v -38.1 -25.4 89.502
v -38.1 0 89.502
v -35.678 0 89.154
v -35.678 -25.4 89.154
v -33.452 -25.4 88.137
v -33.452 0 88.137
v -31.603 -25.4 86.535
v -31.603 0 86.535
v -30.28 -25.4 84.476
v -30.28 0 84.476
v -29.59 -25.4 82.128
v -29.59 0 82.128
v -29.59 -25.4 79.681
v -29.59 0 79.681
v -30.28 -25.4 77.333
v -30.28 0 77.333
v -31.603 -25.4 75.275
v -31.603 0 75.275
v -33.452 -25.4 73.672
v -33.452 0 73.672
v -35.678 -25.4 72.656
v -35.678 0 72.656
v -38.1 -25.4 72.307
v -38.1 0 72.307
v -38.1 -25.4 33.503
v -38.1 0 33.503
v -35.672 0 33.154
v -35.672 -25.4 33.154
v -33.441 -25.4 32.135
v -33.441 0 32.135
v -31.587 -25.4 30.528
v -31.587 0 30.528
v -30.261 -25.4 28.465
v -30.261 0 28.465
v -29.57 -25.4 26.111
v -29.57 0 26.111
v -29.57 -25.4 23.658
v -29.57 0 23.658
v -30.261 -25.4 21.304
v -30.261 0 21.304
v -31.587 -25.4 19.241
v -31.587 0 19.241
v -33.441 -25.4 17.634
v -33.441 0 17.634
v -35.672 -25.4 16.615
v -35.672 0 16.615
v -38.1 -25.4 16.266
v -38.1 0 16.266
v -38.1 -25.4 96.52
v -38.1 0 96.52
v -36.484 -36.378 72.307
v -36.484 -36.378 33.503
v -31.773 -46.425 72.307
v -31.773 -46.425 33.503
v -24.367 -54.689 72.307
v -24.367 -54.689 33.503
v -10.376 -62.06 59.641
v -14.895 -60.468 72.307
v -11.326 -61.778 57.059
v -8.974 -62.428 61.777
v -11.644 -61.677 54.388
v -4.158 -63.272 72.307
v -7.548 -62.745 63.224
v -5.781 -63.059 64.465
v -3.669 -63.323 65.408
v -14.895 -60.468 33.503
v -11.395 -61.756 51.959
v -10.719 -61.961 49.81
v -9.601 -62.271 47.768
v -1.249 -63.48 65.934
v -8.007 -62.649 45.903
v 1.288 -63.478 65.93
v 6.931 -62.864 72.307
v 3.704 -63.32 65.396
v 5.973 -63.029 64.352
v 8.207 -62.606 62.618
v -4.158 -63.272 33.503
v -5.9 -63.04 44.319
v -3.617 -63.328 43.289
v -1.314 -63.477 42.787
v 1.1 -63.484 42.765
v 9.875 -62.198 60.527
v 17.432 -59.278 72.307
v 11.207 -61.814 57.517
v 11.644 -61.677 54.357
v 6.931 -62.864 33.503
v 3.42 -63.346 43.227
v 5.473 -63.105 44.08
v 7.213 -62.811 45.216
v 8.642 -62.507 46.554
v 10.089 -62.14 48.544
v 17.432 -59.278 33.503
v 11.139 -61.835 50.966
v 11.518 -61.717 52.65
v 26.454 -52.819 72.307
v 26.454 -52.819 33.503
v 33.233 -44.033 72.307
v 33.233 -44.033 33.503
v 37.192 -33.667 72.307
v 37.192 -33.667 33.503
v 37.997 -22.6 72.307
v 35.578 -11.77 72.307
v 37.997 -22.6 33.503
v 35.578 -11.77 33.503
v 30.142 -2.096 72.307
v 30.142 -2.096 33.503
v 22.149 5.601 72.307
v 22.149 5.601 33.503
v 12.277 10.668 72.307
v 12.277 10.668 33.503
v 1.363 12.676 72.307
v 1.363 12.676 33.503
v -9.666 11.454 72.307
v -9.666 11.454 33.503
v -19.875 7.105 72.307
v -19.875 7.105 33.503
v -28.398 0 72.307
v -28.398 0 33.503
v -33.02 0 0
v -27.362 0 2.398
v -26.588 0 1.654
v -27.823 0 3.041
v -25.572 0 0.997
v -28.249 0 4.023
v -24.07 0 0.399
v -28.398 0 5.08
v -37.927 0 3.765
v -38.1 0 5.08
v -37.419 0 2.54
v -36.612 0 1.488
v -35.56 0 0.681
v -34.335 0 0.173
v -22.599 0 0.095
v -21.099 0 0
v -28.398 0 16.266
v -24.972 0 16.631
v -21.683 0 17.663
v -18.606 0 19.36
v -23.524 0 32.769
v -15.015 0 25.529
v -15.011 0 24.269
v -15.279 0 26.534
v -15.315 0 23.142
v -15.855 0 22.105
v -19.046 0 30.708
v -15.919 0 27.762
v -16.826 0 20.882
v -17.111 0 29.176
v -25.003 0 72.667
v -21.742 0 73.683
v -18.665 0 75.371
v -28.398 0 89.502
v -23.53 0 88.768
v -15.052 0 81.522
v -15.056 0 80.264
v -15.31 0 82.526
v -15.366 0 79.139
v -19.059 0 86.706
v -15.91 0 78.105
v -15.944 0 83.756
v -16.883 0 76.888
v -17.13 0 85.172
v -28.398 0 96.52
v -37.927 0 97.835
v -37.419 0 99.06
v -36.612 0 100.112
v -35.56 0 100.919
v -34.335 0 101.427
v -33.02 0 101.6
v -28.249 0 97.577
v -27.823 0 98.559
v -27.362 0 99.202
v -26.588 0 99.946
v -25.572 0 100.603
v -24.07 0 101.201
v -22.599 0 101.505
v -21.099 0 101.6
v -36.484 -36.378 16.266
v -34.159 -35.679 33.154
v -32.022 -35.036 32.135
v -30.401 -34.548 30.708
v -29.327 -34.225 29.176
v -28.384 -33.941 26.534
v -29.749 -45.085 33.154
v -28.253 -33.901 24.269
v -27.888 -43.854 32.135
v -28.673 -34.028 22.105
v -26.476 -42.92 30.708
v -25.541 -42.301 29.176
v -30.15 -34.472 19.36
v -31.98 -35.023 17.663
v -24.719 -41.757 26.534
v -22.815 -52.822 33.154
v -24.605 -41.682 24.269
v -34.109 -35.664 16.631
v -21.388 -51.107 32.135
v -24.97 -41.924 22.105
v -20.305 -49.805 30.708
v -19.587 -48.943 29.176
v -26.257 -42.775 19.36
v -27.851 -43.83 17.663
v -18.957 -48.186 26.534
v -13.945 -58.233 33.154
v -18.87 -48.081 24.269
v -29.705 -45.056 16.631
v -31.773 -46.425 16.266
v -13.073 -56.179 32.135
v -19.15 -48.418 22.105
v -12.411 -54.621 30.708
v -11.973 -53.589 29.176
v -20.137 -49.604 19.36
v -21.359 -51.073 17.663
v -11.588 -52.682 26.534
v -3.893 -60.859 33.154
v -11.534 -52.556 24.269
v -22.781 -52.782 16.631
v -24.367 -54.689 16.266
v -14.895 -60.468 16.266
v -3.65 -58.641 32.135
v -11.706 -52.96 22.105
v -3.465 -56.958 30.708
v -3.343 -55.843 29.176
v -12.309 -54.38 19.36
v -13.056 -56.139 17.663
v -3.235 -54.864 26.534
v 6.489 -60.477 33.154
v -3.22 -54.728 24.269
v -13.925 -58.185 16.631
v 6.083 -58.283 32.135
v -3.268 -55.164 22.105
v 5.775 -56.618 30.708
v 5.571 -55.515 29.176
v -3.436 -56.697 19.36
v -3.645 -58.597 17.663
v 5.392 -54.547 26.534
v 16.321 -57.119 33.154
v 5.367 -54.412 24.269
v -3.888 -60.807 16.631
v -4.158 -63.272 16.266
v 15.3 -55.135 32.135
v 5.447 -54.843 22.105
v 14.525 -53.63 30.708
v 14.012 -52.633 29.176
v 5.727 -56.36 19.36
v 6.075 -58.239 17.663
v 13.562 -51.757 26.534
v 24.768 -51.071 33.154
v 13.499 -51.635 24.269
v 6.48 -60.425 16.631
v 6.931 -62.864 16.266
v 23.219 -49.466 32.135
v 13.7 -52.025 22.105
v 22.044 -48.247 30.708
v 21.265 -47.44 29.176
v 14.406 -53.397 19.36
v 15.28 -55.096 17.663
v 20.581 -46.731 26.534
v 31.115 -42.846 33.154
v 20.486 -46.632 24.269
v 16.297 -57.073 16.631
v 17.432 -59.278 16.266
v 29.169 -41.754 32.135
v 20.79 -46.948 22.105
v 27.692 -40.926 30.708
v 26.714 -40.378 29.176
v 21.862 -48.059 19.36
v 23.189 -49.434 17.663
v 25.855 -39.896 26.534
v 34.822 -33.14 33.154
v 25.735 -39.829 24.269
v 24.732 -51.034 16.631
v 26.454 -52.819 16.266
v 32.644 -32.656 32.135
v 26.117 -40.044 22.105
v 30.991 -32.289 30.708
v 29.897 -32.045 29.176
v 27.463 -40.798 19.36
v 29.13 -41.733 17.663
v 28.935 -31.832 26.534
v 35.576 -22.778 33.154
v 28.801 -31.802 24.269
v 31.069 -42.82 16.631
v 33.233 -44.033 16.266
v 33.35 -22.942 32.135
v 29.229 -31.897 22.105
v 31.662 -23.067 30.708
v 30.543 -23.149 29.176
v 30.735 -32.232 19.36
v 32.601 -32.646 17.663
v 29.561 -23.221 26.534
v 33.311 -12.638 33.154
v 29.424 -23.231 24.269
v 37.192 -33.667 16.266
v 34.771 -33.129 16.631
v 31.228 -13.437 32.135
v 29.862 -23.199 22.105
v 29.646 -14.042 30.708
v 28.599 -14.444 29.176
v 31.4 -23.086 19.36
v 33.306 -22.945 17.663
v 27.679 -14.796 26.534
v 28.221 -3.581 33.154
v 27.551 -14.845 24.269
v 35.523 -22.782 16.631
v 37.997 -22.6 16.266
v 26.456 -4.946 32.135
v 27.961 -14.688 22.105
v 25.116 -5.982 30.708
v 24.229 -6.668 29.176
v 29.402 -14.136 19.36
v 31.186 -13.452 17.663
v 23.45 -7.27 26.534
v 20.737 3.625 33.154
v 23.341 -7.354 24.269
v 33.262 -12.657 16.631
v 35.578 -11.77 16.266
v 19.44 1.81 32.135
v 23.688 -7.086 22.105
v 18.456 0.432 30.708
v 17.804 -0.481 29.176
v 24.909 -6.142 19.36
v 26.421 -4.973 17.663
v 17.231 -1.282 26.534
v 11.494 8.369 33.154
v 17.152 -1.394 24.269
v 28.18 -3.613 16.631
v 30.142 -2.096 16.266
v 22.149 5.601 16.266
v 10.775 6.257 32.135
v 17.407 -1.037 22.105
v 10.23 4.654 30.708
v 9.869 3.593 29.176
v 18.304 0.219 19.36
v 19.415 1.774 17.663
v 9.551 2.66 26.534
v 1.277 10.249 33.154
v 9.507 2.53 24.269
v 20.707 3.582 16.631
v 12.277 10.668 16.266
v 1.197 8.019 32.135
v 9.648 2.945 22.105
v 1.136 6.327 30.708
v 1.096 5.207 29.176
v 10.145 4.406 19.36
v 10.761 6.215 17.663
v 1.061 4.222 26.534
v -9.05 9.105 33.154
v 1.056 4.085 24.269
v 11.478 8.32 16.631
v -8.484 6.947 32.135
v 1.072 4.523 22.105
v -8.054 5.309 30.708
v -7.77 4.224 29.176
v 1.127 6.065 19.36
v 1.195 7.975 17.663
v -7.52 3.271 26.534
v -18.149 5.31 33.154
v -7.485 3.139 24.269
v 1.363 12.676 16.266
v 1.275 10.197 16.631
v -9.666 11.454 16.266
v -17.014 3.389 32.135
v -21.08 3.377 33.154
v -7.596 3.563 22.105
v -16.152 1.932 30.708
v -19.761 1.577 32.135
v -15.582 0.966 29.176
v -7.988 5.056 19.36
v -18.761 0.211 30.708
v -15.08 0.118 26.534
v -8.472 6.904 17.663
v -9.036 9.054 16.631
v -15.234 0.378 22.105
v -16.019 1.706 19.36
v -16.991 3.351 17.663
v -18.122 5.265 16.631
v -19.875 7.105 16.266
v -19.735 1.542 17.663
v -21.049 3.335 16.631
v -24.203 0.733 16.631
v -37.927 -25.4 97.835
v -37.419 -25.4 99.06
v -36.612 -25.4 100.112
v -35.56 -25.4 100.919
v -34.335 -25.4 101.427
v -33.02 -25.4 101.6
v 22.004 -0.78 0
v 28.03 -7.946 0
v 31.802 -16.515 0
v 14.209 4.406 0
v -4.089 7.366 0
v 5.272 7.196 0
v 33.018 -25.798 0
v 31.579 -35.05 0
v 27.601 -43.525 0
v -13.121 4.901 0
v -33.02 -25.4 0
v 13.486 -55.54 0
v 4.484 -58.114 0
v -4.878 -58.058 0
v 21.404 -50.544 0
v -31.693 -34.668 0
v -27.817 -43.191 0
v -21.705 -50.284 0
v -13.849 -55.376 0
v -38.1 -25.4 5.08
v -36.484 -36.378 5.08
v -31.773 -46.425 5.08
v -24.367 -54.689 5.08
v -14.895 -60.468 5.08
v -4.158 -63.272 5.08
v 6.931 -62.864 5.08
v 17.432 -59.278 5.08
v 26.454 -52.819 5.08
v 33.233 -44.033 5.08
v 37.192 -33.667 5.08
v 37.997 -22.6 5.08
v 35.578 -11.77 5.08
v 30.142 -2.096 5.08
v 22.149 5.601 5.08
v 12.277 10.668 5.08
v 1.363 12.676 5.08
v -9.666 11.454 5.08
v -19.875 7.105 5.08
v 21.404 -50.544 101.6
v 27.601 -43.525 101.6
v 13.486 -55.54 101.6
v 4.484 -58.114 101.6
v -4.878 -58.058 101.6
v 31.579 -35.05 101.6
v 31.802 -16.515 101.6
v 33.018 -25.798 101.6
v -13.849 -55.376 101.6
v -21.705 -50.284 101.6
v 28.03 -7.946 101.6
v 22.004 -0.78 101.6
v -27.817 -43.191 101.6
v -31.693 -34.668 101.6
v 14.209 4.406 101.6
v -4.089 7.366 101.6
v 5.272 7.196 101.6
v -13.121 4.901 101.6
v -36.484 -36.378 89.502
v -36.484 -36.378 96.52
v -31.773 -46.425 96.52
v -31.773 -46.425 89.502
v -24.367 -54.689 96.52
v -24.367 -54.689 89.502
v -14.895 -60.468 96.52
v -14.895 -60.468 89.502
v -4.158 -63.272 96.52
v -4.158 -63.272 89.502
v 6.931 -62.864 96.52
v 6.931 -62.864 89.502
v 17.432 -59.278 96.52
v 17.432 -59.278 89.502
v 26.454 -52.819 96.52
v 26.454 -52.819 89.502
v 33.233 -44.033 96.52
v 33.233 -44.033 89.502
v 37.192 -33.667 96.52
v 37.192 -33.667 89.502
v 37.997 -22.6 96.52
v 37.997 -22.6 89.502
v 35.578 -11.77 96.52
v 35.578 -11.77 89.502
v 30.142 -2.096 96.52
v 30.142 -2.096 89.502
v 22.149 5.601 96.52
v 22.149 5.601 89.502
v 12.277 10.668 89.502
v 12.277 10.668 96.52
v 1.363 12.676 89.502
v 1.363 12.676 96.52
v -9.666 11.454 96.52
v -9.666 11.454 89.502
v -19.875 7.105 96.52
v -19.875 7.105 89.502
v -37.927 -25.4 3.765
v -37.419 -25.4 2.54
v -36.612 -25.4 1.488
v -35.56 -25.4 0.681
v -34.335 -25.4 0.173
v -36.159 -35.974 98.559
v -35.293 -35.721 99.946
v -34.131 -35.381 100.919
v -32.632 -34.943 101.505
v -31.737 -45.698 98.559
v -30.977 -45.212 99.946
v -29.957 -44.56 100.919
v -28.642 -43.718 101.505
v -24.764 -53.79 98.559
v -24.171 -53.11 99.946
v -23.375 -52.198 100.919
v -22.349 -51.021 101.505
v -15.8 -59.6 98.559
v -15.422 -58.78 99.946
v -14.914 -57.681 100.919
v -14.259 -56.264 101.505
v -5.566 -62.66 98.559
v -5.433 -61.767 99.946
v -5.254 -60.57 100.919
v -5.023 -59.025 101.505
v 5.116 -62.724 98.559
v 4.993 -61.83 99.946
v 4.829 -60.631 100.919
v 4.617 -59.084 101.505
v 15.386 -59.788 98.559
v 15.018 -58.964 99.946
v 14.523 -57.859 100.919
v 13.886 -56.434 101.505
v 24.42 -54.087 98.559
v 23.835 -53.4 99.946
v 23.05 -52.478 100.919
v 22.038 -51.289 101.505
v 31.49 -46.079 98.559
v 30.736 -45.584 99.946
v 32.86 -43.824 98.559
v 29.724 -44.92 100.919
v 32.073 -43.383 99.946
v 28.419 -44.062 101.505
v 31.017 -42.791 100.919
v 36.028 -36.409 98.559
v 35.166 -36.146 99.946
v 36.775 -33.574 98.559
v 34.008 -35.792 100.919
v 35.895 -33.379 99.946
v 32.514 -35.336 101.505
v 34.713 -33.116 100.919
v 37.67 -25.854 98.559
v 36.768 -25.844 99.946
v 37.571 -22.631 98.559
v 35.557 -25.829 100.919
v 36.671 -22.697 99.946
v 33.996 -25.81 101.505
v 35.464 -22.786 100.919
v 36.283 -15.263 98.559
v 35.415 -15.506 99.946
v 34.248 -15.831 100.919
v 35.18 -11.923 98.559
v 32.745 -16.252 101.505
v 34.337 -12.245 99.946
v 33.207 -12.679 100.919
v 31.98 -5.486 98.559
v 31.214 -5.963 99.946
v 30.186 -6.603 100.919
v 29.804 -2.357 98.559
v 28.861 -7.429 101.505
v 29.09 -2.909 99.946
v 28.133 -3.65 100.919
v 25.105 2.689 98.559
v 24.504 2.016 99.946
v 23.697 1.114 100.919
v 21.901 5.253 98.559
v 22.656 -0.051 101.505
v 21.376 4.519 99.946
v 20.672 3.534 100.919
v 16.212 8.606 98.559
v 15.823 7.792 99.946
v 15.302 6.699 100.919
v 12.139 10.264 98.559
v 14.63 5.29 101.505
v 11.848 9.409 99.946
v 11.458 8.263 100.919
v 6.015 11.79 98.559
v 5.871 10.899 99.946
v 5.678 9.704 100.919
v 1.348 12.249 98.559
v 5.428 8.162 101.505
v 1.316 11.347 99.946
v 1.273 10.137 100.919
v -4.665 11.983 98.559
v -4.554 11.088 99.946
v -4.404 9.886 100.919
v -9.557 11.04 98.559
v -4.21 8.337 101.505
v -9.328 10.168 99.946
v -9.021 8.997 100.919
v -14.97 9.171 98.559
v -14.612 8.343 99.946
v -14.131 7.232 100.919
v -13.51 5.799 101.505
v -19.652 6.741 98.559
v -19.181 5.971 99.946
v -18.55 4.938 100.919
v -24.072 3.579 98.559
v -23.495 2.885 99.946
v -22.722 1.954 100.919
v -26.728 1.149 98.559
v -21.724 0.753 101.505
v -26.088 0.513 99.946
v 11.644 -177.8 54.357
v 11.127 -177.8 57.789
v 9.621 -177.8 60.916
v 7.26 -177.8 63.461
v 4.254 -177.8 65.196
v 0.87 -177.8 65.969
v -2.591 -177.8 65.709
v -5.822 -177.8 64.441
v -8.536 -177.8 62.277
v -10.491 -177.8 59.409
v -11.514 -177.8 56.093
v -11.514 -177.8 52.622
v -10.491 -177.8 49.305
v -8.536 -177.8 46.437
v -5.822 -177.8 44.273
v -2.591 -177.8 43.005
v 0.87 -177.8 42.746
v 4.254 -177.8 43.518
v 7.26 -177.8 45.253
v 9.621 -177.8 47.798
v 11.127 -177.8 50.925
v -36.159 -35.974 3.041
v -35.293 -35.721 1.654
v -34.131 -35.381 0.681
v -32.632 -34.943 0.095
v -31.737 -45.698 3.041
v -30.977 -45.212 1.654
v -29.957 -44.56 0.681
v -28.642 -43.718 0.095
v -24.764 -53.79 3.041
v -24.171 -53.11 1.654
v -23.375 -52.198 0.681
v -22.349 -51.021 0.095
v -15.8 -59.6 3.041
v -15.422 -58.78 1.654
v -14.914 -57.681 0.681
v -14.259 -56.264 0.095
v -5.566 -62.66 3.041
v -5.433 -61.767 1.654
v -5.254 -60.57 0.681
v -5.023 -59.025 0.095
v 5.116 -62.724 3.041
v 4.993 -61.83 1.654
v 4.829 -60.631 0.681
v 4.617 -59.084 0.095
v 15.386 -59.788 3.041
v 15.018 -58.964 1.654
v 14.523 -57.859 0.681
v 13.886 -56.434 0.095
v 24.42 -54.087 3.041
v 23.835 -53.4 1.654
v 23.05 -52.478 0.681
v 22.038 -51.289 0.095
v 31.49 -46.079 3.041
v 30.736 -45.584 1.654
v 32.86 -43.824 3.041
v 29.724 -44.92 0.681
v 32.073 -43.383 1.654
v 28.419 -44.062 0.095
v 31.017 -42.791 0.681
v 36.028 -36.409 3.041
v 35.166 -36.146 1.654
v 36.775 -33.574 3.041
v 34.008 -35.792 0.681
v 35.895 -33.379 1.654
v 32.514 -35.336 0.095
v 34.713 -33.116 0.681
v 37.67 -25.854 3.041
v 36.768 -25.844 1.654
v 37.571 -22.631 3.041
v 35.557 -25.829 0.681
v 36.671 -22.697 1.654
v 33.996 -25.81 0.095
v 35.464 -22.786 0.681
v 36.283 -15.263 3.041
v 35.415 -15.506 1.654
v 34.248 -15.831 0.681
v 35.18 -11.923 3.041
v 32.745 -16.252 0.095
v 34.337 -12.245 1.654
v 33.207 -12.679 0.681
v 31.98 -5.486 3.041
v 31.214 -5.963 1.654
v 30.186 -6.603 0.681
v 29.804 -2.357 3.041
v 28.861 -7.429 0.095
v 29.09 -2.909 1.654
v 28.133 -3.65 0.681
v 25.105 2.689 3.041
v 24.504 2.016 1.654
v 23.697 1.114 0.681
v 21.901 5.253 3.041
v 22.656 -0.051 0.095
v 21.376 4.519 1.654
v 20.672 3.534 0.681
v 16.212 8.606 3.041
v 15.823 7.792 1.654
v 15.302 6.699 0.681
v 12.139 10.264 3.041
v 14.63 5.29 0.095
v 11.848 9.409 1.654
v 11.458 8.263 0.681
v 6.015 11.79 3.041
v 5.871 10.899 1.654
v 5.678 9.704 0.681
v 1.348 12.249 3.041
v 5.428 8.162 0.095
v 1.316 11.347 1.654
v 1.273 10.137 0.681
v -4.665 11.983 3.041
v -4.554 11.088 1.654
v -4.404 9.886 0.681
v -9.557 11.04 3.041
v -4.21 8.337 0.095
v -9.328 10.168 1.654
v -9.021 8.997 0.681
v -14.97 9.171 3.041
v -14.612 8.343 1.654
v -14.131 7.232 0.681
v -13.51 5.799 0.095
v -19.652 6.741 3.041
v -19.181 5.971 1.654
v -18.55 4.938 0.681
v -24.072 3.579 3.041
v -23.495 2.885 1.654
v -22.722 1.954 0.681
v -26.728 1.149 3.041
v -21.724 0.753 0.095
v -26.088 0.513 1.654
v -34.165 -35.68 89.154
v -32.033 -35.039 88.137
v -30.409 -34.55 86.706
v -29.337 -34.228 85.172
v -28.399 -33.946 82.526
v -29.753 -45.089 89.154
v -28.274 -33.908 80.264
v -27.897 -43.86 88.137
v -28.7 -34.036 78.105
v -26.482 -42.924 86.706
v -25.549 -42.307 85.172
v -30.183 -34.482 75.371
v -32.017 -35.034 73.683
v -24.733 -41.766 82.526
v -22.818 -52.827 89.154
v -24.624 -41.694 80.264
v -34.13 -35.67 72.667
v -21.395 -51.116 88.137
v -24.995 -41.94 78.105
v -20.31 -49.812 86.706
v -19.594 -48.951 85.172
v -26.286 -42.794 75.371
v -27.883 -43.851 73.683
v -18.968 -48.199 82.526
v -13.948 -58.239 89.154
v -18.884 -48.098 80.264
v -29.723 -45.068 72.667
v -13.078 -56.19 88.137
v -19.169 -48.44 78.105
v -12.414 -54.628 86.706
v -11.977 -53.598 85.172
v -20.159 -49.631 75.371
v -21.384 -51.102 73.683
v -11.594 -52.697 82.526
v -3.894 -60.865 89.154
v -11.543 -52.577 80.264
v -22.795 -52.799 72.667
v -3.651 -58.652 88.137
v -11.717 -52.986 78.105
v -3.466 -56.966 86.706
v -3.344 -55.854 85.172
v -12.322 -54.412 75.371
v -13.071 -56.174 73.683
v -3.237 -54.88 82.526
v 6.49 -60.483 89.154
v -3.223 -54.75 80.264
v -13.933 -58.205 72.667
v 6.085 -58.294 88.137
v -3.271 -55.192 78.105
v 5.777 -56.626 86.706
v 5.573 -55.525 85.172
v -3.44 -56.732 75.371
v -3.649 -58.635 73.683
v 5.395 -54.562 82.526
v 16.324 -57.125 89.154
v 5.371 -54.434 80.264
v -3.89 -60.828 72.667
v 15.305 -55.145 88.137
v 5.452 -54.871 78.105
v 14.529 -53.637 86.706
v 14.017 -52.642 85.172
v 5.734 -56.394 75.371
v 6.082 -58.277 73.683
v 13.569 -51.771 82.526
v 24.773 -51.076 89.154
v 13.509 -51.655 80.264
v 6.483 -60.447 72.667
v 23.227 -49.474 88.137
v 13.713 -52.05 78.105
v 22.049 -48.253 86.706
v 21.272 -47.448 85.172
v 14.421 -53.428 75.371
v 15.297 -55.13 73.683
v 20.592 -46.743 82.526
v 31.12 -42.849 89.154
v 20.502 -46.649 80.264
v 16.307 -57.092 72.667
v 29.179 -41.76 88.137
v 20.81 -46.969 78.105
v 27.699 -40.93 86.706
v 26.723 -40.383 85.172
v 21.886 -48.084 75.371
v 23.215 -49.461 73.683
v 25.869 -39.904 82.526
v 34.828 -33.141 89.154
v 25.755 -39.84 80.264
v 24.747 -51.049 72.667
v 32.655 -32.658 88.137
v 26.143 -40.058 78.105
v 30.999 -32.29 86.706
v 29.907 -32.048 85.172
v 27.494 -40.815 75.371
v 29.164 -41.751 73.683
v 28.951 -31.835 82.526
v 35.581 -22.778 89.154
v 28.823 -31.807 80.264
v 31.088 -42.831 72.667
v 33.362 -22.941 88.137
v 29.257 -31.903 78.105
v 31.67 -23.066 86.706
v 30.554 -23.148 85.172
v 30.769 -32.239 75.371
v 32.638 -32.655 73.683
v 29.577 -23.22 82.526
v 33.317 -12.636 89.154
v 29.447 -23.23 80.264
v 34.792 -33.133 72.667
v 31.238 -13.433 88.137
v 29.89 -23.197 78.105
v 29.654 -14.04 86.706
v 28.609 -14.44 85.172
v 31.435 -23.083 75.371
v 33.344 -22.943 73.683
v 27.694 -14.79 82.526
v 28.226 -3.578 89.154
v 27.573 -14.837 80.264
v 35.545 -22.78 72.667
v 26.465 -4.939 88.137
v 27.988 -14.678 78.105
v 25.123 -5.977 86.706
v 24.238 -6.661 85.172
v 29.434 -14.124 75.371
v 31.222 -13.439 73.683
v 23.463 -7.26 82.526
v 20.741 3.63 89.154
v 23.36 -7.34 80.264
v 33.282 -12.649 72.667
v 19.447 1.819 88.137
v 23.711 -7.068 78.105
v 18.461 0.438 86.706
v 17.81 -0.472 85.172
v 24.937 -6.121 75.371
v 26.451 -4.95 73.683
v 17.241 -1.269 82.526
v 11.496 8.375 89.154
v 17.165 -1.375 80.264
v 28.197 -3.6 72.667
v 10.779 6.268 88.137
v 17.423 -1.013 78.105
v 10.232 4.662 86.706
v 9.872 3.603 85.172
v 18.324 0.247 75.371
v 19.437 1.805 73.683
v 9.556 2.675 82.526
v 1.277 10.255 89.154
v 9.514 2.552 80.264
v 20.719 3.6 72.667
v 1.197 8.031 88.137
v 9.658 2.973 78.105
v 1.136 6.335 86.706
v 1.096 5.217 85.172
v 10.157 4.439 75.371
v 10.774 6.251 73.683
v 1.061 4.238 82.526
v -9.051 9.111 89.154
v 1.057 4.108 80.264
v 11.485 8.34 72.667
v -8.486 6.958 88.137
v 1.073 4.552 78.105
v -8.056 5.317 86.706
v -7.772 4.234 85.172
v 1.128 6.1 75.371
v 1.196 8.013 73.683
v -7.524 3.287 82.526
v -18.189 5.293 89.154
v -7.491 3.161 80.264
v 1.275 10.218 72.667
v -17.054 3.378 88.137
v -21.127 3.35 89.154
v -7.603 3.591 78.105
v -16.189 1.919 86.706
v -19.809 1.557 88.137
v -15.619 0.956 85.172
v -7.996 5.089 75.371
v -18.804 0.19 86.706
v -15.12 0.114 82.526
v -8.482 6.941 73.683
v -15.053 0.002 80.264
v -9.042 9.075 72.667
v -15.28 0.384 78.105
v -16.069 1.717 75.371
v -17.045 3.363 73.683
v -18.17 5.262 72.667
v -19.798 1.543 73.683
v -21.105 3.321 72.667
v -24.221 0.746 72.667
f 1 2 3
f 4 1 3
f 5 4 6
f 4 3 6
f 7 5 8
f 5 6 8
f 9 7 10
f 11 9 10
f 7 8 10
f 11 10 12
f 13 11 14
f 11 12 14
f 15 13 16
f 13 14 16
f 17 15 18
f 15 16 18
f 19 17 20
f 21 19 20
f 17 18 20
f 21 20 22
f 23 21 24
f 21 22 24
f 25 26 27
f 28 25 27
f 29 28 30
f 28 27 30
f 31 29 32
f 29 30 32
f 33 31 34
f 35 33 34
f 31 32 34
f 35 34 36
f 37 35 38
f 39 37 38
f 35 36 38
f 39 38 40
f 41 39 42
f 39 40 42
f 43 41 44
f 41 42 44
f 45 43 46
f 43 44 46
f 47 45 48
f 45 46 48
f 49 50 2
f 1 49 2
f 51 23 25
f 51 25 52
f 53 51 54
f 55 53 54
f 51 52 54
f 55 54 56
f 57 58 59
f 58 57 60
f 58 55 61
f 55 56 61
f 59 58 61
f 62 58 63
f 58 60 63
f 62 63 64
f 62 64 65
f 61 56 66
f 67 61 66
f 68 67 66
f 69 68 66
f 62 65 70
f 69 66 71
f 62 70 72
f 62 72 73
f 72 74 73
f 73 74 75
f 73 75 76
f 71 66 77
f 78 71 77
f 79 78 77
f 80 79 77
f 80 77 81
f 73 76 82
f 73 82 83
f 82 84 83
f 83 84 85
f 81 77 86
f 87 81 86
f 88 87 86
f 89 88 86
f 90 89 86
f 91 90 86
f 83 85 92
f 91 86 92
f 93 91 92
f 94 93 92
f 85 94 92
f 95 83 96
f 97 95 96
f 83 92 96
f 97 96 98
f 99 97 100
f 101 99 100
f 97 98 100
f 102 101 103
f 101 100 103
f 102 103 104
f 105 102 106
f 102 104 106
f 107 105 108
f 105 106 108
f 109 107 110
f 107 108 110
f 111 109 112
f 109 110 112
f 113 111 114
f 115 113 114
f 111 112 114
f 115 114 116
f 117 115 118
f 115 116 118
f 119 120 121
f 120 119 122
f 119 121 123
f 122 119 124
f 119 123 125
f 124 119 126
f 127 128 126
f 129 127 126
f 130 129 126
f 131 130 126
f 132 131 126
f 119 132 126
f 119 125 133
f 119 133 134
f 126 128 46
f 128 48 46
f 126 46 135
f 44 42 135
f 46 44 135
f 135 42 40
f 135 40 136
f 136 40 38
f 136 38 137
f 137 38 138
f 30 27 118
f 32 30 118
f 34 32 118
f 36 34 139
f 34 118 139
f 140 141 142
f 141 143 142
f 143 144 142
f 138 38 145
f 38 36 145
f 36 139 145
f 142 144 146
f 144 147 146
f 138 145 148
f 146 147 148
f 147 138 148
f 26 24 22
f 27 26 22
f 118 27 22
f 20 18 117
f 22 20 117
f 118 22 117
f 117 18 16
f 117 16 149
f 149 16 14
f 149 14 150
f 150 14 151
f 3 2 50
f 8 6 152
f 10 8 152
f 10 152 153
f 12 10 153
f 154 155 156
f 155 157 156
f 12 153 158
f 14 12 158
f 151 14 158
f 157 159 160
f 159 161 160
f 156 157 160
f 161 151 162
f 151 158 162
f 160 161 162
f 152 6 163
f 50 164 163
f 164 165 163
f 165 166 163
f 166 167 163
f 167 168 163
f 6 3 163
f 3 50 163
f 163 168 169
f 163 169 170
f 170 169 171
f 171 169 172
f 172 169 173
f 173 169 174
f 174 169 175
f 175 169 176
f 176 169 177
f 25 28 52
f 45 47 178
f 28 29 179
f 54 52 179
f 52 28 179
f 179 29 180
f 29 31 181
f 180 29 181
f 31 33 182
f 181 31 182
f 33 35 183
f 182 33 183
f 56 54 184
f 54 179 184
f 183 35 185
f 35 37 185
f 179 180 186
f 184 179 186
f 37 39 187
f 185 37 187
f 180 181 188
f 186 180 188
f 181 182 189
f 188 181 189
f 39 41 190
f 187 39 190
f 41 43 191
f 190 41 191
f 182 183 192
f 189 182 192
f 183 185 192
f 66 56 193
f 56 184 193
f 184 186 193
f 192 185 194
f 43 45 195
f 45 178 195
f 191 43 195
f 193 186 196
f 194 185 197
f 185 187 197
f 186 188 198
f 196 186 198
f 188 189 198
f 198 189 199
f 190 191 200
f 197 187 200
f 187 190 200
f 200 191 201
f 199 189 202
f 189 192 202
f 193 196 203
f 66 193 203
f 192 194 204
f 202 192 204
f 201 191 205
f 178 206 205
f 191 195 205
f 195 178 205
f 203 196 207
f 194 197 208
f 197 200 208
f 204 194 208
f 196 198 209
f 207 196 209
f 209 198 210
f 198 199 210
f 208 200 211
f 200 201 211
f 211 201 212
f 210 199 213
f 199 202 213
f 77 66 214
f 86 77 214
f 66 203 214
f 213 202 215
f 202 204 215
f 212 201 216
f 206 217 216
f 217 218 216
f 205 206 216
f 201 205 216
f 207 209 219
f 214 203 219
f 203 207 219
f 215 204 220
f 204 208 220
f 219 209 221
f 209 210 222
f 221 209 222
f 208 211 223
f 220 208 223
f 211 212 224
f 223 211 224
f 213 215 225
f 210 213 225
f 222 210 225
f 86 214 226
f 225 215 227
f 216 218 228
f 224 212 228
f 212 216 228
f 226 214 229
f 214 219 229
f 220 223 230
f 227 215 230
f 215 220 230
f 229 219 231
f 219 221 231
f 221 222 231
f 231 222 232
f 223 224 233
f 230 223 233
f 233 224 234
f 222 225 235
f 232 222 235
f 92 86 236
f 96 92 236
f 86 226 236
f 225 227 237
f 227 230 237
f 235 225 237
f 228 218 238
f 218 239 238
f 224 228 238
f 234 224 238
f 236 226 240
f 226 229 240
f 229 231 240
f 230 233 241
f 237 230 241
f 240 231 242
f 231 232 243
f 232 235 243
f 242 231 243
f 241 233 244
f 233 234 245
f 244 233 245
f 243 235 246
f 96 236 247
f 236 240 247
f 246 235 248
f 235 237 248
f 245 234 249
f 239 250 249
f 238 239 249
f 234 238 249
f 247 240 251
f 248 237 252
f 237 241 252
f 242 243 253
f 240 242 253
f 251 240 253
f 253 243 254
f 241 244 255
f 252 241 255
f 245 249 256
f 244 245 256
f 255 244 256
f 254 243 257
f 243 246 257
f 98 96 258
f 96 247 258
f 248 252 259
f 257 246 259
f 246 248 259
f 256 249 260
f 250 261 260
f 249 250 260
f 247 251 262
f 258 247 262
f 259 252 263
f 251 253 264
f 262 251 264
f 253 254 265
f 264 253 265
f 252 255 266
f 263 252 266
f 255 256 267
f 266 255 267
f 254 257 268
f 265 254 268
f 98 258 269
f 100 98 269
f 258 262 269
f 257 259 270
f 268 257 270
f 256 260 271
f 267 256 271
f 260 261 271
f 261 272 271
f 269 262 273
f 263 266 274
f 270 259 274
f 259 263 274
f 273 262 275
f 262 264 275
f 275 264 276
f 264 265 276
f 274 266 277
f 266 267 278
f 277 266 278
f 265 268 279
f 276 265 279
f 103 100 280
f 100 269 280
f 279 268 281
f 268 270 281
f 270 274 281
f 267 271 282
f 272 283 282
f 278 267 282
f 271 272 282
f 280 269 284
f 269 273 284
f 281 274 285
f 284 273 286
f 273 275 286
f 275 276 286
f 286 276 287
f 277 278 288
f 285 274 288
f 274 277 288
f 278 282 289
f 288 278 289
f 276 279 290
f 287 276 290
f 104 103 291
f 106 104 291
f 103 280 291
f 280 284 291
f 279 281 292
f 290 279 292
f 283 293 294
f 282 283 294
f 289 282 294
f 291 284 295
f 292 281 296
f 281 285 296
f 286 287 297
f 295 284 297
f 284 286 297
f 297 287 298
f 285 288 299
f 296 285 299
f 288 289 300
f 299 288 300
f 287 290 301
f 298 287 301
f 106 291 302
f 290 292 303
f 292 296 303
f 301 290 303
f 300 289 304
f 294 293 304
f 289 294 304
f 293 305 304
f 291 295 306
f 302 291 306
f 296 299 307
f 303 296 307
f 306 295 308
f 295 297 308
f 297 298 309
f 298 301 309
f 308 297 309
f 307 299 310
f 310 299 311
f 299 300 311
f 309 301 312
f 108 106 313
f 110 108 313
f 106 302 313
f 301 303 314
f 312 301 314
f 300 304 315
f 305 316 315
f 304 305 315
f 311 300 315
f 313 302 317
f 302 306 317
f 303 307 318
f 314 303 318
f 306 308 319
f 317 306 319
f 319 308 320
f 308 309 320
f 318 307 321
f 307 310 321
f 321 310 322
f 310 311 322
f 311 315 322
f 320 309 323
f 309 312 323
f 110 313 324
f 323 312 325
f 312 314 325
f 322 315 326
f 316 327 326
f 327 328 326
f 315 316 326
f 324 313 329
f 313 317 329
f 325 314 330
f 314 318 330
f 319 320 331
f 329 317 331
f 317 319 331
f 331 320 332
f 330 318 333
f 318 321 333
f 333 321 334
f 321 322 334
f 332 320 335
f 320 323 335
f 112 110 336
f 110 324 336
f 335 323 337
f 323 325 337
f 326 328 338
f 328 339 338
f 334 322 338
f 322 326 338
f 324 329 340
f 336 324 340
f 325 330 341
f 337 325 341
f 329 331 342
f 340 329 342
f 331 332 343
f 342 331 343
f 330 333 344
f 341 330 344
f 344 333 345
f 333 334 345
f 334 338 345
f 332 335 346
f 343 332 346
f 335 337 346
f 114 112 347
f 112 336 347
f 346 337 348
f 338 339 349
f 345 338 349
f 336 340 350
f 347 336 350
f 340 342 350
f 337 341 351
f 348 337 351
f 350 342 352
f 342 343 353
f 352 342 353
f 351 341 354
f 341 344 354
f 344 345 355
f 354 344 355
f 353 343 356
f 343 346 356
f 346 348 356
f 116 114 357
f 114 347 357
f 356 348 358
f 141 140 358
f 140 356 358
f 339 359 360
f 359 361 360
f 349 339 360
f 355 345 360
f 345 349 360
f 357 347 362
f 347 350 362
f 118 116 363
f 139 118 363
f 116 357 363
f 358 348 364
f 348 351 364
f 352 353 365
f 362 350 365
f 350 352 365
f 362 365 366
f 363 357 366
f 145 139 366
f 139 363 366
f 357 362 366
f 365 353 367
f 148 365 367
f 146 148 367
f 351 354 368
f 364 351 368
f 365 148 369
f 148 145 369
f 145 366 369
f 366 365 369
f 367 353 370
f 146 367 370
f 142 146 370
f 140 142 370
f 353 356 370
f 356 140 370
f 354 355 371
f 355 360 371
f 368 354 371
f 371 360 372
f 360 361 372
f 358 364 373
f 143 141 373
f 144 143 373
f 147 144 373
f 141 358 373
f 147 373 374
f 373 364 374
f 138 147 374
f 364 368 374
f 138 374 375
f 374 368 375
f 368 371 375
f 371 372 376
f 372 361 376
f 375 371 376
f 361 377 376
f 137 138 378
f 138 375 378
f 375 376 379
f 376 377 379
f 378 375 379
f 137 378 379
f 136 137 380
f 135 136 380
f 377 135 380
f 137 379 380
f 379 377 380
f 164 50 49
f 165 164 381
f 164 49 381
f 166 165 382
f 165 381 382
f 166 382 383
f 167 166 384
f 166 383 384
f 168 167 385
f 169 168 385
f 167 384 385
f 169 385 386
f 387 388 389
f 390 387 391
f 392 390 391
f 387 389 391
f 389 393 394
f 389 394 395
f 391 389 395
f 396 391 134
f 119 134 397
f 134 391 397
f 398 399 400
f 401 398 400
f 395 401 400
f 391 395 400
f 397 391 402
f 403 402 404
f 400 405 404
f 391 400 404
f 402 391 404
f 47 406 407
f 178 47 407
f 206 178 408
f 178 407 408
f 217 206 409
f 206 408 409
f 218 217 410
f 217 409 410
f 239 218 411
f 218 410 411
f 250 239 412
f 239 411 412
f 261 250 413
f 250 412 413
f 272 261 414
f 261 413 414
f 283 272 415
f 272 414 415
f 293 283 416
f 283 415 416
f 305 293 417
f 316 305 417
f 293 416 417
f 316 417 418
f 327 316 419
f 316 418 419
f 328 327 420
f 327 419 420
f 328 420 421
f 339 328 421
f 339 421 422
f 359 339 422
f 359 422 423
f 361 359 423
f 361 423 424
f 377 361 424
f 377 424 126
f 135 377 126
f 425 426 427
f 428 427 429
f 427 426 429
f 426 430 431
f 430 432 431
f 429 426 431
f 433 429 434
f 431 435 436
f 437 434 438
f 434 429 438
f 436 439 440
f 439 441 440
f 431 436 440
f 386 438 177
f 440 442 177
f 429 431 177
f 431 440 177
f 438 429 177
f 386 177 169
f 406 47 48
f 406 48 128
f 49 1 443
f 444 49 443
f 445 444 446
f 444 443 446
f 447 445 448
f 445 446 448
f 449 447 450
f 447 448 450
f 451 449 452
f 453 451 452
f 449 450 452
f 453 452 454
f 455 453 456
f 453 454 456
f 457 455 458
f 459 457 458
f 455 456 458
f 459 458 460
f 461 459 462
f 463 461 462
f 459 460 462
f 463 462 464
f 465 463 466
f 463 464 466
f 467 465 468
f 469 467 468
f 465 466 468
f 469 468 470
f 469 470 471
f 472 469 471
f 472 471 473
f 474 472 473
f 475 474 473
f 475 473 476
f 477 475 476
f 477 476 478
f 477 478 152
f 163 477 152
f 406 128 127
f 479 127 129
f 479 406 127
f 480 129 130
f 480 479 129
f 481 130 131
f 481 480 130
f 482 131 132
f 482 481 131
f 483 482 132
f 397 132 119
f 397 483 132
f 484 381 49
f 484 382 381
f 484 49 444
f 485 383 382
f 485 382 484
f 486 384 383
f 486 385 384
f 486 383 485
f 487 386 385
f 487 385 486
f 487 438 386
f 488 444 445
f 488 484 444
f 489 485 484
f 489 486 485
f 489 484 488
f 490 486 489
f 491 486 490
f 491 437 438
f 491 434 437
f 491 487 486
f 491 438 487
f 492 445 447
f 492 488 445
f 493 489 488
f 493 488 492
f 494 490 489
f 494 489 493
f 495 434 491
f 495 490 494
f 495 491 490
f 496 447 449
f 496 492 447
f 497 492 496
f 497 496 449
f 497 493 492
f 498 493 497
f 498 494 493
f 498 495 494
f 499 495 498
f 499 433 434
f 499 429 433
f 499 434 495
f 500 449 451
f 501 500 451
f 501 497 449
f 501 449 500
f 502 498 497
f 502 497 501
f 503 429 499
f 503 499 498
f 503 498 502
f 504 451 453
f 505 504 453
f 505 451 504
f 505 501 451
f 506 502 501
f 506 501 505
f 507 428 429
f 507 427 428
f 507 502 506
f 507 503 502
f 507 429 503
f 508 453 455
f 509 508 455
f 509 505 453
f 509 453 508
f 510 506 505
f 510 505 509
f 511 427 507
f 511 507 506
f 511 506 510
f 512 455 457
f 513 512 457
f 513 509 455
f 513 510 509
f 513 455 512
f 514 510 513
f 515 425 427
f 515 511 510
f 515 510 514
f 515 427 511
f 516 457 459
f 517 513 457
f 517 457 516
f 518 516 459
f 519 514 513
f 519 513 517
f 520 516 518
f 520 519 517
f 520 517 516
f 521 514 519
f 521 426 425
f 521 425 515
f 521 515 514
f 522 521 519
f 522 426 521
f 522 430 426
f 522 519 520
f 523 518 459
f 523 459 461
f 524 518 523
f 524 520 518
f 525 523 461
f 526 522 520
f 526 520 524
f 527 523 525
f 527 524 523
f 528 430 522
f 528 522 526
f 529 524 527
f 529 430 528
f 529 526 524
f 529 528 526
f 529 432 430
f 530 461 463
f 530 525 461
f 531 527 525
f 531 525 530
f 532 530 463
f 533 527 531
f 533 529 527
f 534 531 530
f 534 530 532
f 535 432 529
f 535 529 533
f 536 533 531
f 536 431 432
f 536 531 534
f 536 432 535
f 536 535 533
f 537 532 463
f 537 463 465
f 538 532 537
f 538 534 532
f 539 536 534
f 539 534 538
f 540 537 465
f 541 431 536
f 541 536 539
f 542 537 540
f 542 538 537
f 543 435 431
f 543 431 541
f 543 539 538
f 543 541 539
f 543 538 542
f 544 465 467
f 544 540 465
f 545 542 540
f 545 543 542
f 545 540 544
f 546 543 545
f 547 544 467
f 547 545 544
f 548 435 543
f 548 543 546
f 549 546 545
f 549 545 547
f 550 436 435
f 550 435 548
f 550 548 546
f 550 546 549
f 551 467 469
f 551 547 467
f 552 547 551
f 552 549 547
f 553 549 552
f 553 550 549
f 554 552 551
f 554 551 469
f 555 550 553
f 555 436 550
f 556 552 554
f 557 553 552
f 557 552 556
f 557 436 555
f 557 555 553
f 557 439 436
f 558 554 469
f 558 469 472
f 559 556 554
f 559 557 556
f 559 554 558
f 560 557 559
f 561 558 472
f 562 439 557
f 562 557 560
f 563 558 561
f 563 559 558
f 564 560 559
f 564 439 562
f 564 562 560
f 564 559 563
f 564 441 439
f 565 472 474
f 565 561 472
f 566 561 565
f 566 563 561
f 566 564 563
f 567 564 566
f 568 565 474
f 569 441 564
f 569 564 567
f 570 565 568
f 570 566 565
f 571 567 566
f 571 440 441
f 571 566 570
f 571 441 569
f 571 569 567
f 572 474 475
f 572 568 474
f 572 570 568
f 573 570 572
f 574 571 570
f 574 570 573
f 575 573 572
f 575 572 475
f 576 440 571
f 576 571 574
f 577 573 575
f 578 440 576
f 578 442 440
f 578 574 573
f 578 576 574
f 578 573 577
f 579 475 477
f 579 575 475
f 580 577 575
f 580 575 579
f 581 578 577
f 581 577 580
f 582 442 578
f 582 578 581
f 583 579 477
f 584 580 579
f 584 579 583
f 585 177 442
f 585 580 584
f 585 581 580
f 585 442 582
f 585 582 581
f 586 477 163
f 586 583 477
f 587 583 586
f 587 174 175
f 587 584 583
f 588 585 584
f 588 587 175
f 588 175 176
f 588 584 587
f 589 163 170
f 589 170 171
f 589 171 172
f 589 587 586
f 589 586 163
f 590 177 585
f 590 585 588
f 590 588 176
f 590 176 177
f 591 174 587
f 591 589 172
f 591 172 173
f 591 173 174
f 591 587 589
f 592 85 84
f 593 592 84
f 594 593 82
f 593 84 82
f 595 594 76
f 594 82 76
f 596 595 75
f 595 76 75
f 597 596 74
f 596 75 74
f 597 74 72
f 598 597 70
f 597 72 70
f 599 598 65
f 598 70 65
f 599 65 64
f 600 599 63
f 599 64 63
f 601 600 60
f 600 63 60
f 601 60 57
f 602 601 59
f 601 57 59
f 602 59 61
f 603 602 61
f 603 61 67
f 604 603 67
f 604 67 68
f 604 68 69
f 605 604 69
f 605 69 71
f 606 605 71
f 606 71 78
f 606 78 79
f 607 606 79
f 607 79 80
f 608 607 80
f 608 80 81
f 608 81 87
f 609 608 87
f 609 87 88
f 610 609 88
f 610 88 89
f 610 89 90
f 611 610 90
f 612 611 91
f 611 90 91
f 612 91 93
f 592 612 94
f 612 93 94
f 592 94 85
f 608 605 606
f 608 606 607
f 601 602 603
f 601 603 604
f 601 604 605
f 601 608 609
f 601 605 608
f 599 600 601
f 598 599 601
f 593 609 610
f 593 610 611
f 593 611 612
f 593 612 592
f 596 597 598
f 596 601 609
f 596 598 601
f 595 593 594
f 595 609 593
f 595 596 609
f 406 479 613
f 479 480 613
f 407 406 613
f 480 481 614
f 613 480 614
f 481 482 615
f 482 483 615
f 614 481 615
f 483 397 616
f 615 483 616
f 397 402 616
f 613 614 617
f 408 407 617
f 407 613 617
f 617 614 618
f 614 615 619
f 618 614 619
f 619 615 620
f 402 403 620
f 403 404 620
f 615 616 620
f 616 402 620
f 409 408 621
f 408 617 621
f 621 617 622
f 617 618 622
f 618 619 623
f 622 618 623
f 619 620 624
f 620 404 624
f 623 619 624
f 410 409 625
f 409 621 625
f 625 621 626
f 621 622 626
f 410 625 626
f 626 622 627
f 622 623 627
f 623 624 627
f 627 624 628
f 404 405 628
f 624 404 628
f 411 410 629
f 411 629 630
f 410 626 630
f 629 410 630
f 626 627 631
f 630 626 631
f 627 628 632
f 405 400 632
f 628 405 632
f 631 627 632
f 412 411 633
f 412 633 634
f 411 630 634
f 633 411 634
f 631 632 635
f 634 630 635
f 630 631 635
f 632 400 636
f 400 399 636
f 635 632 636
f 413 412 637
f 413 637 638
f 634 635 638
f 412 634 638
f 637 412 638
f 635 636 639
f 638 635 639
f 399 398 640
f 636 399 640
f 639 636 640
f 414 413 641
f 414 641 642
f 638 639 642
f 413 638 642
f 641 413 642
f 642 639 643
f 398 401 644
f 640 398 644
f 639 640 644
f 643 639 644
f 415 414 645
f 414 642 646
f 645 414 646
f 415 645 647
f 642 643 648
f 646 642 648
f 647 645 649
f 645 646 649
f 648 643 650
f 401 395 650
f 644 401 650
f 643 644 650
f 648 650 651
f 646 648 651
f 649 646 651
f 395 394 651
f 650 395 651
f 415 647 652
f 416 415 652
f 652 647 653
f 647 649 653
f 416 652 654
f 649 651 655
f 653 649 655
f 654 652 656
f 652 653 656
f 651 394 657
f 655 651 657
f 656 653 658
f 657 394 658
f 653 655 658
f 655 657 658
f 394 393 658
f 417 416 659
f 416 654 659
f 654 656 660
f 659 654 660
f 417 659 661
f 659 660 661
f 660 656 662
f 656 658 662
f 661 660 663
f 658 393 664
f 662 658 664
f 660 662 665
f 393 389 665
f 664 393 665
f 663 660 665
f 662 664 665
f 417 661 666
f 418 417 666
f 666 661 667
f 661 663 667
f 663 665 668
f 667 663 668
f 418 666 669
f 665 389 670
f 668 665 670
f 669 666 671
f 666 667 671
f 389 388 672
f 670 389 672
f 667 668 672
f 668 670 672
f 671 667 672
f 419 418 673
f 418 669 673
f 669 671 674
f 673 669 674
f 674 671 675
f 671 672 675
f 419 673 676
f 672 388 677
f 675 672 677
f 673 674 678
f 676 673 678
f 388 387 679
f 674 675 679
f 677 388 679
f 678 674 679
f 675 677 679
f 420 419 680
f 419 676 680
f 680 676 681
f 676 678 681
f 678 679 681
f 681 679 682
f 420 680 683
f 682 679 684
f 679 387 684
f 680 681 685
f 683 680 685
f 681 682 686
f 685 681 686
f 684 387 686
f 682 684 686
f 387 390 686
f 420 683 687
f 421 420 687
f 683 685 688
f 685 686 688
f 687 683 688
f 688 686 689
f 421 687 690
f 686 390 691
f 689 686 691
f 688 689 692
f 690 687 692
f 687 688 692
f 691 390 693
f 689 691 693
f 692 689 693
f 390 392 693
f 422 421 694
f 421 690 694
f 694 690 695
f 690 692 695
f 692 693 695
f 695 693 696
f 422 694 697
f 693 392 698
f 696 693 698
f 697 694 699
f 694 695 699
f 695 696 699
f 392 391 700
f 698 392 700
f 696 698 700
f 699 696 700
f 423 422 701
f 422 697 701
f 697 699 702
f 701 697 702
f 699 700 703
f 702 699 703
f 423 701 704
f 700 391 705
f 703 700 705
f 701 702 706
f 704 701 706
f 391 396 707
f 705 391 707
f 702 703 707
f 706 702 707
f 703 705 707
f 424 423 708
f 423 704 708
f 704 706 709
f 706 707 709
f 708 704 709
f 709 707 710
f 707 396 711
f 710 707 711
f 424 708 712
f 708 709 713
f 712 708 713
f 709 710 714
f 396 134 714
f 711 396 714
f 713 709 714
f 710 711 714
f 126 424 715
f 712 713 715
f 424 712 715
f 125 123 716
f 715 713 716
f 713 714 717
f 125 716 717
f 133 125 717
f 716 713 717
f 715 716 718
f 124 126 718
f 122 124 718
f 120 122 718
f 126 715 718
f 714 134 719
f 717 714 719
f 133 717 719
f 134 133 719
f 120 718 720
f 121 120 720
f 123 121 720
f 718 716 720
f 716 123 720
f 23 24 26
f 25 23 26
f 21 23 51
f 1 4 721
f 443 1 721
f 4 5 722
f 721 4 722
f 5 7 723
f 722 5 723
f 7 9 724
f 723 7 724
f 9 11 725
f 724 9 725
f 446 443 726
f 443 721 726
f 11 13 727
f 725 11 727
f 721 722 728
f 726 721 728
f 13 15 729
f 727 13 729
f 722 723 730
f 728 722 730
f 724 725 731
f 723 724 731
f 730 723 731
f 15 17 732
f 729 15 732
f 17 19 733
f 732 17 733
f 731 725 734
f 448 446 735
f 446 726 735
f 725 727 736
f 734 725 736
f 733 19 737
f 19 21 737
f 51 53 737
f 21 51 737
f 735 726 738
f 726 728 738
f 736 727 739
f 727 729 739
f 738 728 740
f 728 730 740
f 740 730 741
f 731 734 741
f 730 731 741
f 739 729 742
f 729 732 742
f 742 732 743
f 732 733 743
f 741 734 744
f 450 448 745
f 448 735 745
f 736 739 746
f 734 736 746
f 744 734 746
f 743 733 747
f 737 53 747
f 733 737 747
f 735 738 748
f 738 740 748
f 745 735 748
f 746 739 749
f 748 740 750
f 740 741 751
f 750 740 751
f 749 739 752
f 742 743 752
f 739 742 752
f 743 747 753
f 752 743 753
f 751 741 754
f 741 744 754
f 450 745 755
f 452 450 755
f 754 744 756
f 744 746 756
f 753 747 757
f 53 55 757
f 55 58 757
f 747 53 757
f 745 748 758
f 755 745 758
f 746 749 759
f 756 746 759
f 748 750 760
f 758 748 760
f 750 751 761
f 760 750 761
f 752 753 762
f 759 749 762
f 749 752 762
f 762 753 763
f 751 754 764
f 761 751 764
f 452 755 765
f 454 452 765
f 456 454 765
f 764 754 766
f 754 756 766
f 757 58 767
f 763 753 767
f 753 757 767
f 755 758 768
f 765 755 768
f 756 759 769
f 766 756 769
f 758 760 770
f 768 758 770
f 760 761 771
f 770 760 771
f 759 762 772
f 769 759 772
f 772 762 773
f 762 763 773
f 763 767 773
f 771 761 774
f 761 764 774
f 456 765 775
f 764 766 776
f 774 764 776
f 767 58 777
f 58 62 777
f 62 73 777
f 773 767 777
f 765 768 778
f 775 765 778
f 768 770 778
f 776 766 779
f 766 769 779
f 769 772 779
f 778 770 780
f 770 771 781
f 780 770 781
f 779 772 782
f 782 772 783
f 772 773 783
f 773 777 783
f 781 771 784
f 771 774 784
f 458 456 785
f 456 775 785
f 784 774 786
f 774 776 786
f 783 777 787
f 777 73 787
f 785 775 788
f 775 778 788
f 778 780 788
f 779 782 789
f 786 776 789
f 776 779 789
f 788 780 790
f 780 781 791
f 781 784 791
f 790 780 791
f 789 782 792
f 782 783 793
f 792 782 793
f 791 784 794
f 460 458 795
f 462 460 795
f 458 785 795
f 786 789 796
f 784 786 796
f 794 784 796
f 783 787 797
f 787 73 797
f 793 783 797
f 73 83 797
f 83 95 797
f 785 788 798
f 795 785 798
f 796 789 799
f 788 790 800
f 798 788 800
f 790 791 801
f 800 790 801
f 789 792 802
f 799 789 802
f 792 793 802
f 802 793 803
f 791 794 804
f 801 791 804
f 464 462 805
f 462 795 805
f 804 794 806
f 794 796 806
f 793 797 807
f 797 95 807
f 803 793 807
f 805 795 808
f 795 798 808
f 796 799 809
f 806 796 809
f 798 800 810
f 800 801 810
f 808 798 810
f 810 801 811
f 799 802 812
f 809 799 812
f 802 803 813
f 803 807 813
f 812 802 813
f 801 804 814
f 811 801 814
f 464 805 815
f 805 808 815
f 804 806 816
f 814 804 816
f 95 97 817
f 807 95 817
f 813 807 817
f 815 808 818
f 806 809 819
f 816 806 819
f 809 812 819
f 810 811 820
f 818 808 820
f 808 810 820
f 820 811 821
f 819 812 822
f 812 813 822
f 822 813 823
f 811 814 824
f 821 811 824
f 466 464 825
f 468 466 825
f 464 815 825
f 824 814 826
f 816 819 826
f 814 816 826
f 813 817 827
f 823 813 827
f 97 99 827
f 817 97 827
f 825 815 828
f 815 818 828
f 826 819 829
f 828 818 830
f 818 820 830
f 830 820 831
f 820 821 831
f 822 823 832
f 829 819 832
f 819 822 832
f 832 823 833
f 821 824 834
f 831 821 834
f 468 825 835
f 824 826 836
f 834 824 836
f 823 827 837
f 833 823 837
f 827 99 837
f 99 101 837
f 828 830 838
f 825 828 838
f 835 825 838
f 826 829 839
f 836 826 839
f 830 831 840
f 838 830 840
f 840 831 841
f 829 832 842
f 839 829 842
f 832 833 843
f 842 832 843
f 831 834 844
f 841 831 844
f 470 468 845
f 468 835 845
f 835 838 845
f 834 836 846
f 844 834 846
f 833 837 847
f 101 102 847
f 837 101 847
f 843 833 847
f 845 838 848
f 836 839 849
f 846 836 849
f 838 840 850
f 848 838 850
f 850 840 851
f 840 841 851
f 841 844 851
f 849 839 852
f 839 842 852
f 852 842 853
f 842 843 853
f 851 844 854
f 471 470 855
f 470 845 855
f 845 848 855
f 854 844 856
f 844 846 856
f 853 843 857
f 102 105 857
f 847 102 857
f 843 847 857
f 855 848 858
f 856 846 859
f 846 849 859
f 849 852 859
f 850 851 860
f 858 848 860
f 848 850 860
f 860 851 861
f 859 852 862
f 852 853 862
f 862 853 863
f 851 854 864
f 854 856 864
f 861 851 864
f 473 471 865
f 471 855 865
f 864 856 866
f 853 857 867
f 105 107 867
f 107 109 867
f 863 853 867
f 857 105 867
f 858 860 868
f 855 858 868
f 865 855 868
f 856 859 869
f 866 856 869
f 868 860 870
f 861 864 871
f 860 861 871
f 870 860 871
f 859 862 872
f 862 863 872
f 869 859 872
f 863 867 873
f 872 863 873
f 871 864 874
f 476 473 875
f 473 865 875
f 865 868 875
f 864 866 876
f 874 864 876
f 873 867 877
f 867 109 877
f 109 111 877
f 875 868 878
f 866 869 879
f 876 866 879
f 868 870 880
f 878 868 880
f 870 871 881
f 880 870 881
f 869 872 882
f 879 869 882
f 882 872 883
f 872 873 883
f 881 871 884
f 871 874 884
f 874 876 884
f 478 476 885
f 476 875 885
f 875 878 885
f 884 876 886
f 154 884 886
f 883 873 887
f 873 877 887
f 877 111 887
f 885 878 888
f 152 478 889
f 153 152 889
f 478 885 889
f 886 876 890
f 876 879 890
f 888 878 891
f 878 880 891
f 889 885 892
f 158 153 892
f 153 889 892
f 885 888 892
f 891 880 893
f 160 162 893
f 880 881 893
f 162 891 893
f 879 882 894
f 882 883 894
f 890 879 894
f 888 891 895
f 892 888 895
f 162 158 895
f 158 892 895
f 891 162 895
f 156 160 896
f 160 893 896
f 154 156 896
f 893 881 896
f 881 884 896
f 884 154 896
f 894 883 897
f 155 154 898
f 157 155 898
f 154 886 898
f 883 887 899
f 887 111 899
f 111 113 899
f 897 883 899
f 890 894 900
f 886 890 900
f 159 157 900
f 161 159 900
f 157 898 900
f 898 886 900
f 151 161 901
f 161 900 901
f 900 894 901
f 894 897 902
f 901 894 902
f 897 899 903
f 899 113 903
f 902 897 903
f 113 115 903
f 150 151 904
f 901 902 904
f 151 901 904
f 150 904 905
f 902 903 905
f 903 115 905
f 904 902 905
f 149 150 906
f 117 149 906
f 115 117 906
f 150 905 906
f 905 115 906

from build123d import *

# Parameters (mm, degrees)
F1_DEPTH = 25.4
F3_R     = 11.6440709306
F4_DEPTH = 177.8
F5_R     = 5.08


with BuildPart() as f1:
    # F0 (on Front) → F1 (new body)
    with BuildSketch(Plane.XZ):
        with BuildLine():
            Line((-38.1, 0), (0, 0))
            Line((0, 0), (0, 101.6))
            Line((0, 101.6), (-38.1, 101.6))
            Line((-38.1, 101.6), (-38.1, 89.5017794386))
            ThreePointArc((-38.1, 89.5017794386), (-29.5028533681, 80.9046328068), (-38.1, 72.3074861749))
            Line((-38.1, 72.3074861749), (-38.1, 33.5026137211))
            ThreePointArc((-38.1, 33.5026137211), (-29.4818803005, 24.8844940215), (-38.1, 16.266374322))
            Line((-38.1, 16.266374322), (-38.1, 0))
        make_face()
    extrude(amount=F1_DEPTH)

    # F1_face (on face) → F2 (revolve)
    with BuildSketch(Plane(origin=(-18.0649405822, -25.4, 50.6703599906), x_dir=(1, 0, 0), z_dir=(0, -1, 0))):
        with BuildLine():
            Line((-20.0350594178, -34.4039856686), (-20.0350594178, -50.6703599906))
            Line((-20.0350594178, -50.6703599906), (18.0649405822, -50.6703599906))
            Line((18.0649405822, -50.6703599906), (18.0649405822, 50.9296400094))
            Line((18.0649405822, 50.9296400094), (-20.0350594178, 50.9296400094))
            Line((-20.0350594178, 50.9296400094), (-20.0350594178, 38.831419448))
            ThreePointArc((-20.0350594178, 38.831419448), (-11.437912786, 30.2342728161), (-20.0350594178, 21.6371261843))
            Line((-20.0350594178, 21.6371261843), (-20.0350594178, -17.1677462696))
            ThreePointArc((-20.0350594178, -17.1677462696), (-11.4169397183, -25.7858659691), (-20.0350594178, -34.4039856686))
        make_face()
    revolve(axis=Axis((0, -25.4, 50.8), (0, 0, 1)))

    # F3 (on Front) → F4 (join)
    with BuildSketch(Plane.XZ):
        with Locations((0, 54.3571226299)):
            Circle(F3_R)
    extrude(amount=F4_DEPTH)

    # F5
    f5_edges = [f1.edges().sort_by_distance(p)[0] for p in [
        (35.591967, -38.994922, 101.6),
        (35.591967, -38.994922, 0),
    ]]
    fillet(f5_edges, radius=F5_R)


solid = f1.part
